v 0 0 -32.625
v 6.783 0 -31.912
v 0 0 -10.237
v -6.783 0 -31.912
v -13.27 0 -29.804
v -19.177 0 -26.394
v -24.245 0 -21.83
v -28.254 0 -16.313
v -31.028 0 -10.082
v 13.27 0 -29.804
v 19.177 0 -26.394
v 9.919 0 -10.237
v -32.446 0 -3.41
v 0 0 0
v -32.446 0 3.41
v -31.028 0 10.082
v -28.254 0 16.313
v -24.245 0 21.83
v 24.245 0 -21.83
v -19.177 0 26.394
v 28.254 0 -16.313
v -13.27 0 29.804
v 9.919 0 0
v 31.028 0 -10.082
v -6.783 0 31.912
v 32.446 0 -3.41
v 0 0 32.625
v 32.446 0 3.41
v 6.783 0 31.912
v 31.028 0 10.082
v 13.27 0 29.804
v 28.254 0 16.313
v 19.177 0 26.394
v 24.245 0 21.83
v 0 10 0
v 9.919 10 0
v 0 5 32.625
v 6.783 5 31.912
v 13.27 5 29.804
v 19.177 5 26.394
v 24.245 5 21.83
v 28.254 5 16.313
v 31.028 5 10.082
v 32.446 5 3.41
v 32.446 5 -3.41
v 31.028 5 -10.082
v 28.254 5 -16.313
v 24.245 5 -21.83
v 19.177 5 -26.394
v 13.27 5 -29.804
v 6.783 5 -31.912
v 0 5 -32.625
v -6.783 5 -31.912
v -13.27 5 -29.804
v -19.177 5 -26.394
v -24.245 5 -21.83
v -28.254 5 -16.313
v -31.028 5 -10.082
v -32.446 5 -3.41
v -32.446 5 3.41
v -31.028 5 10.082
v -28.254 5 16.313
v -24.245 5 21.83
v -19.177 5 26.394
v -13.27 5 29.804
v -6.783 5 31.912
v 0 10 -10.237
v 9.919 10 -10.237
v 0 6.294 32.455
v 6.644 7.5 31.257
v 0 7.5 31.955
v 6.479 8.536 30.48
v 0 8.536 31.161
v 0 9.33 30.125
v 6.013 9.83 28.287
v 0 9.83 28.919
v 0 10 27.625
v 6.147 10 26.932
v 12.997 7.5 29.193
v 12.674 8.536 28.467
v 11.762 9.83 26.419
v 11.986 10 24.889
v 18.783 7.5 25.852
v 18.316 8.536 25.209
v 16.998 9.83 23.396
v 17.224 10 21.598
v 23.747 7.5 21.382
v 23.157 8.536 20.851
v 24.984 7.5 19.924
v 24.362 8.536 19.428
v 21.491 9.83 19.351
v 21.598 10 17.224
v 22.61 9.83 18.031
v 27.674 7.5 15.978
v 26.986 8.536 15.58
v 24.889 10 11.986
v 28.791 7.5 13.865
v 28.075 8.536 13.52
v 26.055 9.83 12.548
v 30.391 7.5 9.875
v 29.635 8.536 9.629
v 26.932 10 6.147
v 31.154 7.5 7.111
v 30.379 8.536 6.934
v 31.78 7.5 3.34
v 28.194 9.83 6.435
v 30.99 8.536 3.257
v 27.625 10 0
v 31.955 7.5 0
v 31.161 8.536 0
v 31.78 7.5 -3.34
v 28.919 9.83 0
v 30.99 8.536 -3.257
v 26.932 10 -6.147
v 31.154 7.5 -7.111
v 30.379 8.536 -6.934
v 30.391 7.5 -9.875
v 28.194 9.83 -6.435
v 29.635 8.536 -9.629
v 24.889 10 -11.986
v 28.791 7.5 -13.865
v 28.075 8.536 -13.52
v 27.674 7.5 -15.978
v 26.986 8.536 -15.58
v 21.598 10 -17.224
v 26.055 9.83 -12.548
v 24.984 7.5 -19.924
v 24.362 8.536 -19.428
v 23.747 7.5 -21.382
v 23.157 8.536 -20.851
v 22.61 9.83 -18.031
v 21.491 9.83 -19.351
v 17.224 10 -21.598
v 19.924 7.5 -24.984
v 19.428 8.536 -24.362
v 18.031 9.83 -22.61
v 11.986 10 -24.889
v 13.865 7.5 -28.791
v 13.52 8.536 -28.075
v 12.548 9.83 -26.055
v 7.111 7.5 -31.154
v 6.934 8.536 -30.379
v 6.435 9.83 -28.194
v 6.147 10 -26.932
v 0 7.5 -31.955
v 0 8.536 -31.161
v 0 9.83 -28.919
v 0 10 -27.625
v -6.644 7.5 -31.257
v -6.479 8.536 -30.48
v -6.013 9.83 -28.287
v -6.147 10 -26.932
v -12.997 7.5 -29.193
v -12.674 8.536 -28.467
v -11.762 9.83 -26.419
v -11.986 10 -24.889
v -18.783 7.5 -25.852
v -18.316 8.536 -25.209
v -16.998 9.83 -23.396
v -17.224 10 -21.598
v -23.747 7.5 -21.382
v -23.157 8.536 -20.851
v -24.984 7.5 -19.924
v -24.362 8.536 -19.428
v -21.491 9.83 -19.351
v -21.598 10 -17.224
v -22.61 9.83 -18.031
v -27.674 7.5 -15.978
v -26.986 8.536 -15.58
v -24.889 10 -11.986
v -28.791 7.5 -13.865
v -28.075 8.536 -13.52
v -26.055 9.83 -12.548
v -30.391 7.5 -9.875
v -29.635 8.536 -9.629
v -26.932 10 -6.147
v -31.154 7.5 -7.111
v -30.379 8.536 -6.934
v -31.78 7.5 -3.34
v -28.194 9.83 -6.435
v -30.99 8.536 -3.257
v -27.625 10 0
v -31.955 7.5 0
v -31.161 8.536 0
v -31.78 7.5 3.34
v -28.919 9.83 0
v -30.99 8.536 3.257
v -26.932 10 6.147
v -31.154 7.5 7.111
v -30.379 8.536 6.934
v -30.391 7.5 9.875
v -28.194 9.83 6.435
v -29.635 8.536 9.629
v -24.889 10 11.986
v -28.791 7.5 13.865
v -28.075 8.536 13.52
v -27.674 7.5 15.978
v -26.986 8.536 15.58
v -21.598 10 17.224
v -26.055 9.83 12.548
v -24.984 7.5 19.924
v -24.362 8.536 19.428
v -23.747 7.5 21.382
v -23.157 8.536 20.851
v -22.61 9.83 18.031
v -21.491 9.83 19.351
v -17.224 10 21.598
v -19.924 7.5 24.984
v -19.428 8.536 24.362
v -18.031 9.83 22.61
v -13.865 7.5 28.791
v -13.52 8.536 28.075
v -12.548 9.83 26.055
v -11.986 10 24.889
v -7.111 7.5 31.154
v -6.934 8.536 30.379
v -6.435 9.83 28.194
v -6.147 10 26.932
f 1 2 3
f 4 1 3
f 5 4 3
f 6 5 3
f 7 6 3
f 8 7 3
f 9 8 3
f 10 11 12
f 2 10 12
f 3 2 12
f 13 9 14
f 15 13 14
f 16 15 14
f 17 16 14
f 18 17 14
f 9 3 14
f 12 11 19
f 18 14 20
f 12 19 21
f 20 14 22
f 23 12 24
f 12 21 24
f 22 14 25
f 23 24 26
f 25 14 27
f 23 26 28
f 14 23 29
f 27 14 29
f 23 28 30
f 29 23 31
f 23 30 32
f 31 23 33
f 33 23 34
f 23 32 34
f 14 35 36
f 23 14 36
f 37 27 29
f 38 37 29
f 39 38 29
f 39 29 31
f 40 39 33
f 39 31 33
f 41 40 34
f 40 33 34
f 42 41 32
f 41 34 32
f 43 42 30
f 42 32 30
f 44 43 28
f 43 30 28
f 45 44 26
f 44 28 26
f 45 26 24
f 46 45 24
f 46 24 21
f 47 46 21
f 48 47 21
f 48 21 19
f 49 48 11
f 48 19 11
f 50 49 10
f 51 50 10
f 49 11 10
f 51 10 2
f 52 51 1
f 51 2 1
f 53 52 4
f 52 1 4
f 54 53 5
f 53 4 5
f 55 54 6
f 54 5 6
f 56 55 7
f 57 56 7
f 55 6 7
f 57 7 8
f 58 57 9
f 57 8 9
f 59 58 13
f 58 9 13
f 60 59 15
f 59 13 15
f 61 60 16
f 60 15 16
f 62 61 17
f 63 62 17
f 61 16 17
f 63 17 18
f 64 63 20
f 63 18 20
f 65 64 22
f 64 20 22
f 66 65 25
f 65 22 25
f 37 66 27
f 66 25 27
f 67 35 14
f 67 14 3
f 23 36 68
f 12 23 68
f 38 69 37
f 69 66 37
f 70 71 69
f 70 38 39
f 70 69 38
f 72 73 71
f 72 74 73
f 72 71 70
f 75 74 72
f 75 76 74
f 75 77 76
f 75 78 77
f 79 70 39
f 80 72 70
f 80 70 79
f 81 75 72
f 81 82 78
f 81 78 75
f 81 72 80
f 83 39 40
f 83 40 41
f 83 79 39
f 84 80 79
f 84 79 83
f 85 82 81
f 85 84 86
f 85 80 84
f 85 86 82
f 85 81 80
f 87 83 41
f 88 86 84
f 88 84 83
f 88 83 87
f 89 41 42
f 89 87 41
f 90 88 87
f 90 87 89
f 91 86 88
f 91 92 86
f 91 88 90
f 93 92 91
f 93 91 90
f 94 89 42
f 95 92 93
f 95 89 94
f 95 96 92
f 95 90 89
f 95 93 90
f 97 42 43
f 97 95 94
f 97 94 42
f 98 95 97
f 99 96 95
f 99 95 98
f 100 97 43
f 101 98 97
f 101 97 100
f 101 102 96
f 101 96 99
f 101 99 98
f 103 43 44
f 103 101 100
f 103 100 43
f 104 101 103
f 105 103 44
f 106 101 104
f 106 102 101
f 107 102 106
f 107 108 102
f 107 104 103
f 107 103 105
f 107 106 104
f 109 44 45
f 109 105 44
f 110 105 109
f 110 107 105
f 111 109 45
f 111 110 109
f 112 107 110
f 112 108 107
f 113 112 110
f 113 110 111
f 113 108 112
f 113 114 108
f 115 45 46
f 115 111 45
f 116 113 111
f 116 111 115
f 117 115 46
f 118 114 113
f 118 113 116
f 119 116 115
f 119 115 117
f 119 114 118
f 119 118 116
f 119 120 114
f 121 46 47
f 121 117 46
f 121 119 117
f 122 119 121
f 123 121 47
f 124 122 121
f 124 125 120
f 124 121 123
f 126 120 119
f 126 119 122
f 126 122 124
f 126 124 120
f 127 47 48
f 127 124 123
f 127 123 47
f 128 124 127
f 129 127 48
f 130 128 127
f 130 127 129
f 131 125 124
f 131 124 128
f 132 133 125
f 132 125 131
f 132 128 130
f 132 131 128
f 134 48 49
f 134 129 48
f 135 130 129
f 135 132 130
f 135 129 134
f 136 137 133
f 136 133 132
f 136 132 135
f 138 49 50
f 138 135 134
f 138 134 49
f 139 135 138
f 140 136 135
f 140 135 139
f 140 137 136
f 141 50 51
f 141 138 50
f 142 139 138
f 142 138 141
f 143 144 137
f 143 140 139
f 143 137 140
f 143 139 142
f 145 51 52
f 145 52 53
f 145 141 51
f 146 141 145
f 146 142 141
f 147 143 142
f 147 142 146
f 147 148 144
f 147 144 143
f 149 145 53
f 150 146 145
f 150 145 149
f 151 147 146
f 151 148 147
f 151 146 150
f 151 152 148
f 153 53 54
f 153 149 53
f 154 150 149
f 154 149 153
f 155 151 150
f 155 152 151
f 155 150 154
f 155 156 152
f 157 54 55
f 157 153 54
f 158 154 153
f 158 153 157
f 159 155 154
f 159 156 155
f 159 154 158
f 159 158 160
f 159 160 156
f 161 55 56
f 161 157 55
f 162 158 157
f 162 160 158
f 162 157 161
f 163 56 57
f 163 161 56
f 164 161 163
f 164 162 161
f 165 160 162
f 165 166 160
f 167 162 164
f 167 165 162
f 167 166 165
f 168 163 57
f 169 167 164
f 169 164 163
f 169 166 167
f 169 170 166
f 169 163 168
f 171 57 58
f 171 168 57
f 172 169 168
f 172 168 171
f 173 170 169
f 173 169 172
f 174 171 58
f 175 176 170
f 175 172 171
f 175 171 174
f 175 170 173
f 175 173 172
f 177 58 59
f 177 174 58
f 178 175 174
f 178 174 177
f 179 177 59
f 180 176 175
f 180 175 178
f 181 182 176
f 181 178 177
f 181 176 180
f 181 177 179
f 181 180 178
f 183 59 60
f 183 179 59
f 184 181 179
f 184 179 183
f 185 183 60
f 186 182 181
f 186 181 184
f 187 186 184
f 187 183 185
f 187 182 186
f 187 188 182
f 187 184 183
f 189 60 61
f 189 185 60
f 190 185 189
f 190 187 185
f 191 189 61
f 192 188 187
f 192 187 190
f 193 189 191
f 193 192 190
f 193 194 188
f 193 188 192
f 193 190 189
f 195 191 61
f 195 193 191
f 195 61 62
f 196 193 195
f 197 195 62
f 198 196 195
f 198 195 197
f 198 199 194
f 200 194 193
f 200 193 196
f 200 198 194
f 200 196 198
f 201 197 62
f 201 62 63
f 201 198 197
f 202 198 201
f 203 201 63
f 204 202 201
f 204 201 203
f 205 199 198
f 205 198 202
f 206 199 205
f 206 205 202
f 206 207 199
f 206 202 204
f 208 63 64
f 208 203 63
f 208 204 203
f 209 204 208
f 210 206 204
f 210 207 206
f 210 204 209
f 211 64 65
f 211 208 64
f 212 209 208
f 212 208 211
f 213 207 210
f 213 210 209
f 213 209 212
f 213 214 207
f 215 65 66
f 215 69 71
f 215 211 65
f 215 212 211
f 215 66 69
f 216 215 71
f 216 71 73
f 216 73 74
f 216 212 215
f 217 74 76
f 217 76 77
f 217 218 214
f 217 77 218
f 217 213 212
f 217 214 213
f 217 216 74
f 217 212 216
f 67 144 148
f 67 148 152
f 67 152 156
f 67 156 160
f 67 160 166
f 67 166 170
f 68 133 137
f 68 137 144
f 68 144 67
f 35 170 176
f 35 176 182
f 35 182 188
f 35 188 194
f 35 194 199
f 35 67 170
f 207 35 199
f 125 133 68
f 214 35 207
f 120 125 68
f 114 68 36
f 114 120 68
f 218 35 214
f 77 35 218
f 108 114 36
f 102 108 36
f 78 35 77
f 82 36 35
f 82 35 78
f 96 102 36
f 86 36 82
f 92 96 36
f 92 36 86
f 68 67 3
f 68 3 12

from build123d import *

# Parameters (mm, degrees)
SKETCH1_R           = 32.625062454
BOSS_EXTRUDE1_DEPTH = 10
FILLET1_R           = 5
SKETCH2_W           = 9.918534818
SKETCH2_H           = 10.237019881
CUT_EXTRUDE1_DEPTH  = 10


with BuildPart() as part:
    # Sketch1 → Boss-Extrude1 (new body)
    with BuildSketch(Plane(origin=(0, 0, 0), x_dir=(1, 0, 0), z_dir=(0, 1, 0))):
        with Locations(Location((0, 0, 0), (0, 0, 270))):  # turned: the seam where the file's is
            Circle(SKETCH1_R)
    extrude(amount=BOSS_EXTRUDE1_DEPTH)

    # Fillet1
    fillet1_edges = [part.edges().sort_by_distance(p)[0] for p in [
        (0, 10, -32.625062454),
    ]]
    fillet(fillet1_edges, radius=FILLET1_R)

    # Sketch2 → Cut-Extrude1 (cut)
    with BuildSketch(Plane(origin=(0, 10, 0), x_dir=(1, 0, 0), z_dir=(0, 1, 0))):
        with Locations((4.959267409, 5.118509941)):
            Rectangle(SKETCH2_W, SKETCH2_H)
    extrude(amount=-CUT_EXTRUDE1_DEPTH, mode=Mode.SUBTRACT)


solid = part.part
